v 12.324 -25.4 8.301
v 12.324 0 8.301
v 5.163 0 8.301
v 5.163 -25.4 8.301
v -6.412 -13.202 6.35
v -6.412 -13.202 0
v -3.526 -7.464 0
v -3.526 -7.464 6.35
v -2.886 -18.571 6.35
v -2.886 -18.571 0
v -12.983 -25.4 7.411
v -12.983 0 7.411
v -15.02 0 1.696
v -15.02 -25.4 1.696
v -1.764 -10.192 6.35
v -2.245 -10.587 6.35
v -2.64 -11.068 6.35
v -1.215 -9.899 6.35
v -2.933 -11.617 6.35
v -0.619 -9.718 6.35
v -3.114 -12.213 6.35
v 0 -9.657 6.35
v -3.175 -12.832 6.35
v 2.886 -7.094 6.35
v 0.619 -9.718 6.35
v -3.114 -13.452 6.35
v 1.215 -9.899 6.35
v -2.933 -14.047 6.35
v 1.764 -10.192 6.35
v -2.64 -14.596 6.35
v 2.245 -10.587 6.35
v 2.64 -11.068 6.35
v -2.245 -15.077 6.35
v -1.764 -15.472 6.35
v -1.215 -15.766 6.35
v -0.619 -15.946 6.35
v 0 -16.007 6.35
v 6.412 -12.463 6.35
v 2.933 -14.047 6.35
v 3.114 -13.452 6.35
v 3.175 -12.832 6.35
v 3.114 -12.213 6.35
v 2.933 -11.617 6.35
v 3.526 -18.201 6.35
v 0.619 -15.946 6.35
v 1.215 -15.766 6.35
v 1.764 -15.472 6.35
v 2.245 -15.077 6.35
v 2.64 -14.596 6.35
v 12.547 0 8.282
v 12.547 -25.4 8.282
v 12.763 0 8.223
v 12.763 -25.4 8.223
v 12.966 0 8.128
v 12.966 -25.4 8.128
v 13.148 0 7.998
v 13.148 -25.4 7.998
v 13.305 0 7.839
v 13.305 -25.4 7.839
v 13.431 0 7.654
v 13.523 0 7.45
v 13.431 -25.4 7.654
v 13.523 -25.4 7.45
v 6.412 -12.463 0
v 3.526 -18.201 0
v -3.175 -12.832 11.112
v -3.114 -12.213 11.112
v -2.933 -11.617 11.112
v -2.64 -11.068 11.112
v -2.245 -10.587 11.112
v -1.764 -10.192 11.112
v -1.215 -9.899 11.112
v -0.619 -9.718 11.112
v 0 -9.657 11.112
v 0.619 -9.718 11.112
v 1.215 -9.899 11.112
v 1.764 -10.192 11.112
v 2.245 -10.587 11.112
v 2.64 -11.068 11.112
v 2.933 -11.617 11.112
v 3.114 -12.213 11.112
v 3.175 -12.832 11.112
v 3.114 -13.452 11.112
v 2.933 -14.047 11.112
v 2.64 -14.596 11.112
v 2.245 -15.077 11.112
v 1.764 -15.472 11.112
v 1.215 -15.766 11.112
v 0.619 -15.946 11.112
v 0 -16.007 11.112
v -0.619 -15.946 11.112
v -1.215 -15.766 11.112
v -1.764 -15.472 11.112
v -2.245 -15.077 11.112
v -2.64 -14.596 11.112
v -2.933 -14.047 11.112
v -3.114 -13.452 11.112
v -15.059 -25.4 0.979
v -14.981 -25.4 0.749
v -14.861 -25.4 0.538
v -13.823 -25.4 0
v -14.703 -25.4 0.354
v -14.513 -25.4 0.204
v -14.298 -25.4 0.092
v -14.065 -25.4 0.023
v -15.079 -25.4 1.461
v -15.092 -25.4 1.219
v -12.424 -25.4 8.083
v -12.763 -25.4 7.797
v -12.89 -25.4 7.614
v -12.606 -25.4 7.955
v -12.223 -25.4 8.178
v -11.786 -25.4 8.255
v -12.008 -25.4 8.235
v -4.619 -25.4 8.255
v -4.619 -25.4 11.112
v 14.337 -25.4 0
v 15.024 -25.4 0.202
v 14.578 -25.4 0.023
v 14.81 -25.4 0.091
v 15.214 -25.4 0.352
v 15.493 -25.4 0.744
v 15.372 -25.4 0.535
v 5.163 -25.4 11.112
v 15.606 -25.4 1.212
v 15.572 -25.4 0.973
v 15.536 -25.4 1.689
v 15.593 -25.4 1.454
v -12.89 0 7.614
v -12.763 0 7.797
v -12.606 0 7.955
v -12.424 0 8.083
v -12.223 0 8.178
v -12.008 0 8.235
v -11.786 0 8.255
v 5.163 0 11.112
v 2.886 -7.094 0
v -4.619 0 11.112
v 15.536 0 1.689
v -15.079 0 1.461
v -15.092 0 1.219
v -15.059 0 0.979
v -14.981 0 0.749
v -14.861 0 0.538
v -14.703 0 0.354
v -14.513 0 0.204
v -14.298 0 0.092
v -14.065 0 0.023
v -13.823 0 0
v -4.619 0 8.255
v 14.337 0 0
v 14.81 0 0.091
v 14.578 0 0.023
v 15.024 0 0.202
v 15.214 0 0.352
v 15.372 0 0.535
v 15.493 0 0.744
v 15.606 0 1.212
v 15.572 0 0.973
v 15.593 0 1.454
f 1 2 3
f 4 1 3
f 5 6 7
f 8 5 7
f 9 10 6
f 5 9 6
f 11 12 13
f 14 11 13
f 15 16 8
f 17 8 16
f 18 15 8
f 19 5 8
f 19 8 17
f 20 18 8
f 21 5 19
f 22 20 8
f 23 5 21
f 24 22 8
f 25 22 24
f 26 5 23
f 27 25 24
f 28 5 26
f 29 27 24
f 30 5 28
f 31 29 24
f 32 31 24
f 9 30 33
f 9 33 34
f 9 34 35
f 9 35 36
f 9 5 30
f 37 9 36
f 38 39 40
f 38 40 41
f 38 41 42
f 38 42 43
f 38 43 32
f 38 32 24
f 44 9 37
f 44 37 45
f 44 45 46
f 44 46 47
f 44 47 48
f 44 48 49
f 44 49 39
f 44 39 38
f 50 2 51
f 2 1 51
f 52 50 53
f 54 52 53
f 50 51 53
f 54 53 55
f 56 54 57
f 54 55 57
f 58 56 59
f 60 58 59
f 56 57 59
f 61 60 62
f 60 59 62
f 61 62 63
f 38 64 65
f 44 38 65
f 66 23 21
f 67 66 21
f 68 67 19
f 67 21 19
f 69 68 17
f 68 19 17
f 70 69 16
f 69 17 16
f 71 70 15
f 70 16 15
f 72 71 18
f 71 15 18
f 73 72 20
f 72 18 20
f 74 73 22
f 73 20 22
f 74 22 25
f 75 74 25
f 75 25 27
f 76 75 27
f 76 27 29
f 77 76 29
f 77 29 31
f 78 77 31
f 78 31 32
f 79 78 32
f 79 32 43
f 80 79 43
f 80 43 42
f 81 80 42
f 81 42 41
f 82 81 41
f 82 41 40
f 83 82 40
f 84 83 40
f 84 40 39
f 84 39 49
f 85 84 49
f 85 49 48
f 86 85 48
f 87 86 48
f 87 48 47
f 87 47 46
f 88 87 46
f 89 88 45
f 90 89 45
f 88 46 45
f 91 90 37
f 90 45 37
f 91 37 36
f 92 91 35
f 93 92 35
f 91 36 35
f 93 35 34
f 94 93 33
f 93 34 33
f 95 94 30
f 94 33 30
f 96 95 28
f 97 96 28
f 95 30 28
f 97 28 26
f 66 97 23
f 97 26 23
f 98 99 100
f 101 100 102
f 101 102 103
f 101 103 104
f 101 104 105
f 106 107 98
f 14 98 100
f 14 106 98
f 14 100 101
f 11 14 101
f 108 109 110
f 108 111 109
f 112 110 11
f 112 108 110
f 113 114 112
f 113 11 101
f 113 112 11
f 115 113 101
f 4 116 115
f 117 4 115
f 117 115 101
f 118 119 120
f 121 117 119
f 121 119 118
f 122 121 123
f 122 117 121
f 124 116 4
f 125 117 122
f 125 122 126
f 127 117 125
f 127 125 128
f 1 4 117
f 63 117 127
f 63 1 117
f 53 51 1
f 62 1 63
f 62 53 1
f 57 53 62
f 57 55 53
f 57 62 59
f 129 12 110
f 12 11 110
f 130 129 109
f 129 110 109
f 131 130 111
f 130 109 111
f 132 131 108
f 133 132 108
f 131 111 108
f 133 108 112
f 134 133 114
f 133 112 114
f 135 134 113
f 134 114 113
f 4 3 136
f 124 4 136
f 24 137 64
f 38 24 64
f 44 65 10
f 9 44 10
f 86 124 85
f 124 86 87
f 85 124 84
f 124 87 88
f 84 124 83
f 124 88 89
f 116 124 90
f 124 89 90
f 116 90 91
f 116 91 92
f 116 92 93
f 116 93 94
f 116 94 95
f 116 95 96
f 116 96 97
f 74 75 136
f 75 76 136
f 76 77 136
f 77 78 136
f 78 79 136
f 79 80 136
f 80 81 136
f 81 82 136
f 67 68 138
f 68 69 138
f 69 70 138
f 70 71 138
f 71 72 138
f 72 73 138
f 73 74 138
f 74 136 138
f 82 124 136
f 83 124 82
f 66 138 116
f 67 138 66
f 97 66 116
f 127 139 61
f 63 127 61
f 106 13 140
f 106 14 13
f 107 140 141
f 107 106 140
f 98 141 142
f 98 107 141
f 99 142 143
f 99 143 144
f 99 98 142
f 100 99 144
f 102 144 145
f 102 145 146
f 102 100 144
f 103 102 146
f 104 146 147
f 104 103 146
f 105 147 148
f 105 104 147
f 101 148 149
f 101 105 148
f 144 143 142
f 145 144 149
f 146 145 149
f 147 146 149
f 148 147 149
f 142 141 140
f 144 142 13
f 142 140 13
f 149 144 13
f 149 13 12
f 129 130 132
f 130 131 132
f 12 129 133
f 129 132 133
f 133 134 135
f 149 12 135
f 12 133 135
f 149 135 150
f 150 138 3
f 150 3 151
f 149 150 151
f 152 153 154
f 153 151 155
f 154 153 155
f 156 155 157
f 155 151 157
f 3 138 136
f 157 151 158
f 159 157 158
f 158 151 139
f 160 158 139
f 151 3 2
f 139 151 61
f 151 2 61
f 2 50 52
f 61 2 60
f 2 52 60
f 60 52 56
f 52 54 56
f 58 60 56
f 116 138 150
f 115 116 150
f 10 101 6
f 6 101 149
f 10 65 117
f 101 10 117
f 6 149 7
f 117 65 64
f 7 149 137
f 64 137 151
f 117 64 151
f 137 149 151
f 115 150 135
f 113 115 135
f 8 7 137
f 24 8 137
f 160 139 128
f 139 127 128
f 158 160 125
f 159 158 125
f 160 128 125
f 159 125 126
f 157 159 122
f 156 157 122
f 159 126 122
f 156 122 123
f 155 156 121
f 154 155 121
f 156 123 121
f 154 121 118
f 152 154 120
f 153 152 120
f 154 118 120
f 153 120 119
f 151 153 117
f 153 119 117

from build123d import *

# Parameters (mm, degrees)
F1_DEPTH = 25.4
F3_D     = 6.35
F4_R     = 3.175
F5_DEPTH = 6.35
F6_R     = 1.27


with BuildPart() as f1:
    # F0 (on Front) → F1 (new body)
    with BuildSketch(Plane.XZ):
        Polygon((-12.6819006406, 8.255), (-15.624309808, 0), (16.125690192, 0), (13.2260993594, 8.3013381809), (5.1634775414, 8.3013381809), (5.1634775414, 11.1125), (-4.6192788226, 11.1125), (-4.6192788226, 8.255), align=None)
    extrude(amount=F1_DEPTH)

    # F3 (through all)
    with Locations(Plane.XY.offset(11.1125)):
        with Locations((0, -12.8323249519)):
            Hole(F3_D / 2)

    # F4 (on face) → F5 (cut)
    with BuildSketch(Plane(origin=(0, 0, 0), x_dir=(1, 0, 0), z_dir=(0, 0, -1))):
        Polygon((-6.4124855846, 13.2020820447), (-3.5264618279, 7.4638280807), (2.8860237566, 7.0940709878), (6.4124855846, 12.462567859), (3.5264618279, 18.2008218231), (-2.8860237566, 18.570578916), align=None)
        with Locations((0, 12.8323249519)):
            Circle(F4_R, mode=Mode.SUBTRACT)
    extrude(amount=-F5_DEPTH, mode=Mode.SUBTRACT)

    # F6
    f6_edges = [f1.edges().sort_by_distance(p)[0] for p in [
        (16.12569, -12.7, 0),
        (-15.62431, -12.7, 0),
        (13.226099, -12.7, 8.301338),
        (-12.681901, -12.7, 8.255),
    ]]
    fillet(f6_edges, radius=F6_R)


solid = f1.part
